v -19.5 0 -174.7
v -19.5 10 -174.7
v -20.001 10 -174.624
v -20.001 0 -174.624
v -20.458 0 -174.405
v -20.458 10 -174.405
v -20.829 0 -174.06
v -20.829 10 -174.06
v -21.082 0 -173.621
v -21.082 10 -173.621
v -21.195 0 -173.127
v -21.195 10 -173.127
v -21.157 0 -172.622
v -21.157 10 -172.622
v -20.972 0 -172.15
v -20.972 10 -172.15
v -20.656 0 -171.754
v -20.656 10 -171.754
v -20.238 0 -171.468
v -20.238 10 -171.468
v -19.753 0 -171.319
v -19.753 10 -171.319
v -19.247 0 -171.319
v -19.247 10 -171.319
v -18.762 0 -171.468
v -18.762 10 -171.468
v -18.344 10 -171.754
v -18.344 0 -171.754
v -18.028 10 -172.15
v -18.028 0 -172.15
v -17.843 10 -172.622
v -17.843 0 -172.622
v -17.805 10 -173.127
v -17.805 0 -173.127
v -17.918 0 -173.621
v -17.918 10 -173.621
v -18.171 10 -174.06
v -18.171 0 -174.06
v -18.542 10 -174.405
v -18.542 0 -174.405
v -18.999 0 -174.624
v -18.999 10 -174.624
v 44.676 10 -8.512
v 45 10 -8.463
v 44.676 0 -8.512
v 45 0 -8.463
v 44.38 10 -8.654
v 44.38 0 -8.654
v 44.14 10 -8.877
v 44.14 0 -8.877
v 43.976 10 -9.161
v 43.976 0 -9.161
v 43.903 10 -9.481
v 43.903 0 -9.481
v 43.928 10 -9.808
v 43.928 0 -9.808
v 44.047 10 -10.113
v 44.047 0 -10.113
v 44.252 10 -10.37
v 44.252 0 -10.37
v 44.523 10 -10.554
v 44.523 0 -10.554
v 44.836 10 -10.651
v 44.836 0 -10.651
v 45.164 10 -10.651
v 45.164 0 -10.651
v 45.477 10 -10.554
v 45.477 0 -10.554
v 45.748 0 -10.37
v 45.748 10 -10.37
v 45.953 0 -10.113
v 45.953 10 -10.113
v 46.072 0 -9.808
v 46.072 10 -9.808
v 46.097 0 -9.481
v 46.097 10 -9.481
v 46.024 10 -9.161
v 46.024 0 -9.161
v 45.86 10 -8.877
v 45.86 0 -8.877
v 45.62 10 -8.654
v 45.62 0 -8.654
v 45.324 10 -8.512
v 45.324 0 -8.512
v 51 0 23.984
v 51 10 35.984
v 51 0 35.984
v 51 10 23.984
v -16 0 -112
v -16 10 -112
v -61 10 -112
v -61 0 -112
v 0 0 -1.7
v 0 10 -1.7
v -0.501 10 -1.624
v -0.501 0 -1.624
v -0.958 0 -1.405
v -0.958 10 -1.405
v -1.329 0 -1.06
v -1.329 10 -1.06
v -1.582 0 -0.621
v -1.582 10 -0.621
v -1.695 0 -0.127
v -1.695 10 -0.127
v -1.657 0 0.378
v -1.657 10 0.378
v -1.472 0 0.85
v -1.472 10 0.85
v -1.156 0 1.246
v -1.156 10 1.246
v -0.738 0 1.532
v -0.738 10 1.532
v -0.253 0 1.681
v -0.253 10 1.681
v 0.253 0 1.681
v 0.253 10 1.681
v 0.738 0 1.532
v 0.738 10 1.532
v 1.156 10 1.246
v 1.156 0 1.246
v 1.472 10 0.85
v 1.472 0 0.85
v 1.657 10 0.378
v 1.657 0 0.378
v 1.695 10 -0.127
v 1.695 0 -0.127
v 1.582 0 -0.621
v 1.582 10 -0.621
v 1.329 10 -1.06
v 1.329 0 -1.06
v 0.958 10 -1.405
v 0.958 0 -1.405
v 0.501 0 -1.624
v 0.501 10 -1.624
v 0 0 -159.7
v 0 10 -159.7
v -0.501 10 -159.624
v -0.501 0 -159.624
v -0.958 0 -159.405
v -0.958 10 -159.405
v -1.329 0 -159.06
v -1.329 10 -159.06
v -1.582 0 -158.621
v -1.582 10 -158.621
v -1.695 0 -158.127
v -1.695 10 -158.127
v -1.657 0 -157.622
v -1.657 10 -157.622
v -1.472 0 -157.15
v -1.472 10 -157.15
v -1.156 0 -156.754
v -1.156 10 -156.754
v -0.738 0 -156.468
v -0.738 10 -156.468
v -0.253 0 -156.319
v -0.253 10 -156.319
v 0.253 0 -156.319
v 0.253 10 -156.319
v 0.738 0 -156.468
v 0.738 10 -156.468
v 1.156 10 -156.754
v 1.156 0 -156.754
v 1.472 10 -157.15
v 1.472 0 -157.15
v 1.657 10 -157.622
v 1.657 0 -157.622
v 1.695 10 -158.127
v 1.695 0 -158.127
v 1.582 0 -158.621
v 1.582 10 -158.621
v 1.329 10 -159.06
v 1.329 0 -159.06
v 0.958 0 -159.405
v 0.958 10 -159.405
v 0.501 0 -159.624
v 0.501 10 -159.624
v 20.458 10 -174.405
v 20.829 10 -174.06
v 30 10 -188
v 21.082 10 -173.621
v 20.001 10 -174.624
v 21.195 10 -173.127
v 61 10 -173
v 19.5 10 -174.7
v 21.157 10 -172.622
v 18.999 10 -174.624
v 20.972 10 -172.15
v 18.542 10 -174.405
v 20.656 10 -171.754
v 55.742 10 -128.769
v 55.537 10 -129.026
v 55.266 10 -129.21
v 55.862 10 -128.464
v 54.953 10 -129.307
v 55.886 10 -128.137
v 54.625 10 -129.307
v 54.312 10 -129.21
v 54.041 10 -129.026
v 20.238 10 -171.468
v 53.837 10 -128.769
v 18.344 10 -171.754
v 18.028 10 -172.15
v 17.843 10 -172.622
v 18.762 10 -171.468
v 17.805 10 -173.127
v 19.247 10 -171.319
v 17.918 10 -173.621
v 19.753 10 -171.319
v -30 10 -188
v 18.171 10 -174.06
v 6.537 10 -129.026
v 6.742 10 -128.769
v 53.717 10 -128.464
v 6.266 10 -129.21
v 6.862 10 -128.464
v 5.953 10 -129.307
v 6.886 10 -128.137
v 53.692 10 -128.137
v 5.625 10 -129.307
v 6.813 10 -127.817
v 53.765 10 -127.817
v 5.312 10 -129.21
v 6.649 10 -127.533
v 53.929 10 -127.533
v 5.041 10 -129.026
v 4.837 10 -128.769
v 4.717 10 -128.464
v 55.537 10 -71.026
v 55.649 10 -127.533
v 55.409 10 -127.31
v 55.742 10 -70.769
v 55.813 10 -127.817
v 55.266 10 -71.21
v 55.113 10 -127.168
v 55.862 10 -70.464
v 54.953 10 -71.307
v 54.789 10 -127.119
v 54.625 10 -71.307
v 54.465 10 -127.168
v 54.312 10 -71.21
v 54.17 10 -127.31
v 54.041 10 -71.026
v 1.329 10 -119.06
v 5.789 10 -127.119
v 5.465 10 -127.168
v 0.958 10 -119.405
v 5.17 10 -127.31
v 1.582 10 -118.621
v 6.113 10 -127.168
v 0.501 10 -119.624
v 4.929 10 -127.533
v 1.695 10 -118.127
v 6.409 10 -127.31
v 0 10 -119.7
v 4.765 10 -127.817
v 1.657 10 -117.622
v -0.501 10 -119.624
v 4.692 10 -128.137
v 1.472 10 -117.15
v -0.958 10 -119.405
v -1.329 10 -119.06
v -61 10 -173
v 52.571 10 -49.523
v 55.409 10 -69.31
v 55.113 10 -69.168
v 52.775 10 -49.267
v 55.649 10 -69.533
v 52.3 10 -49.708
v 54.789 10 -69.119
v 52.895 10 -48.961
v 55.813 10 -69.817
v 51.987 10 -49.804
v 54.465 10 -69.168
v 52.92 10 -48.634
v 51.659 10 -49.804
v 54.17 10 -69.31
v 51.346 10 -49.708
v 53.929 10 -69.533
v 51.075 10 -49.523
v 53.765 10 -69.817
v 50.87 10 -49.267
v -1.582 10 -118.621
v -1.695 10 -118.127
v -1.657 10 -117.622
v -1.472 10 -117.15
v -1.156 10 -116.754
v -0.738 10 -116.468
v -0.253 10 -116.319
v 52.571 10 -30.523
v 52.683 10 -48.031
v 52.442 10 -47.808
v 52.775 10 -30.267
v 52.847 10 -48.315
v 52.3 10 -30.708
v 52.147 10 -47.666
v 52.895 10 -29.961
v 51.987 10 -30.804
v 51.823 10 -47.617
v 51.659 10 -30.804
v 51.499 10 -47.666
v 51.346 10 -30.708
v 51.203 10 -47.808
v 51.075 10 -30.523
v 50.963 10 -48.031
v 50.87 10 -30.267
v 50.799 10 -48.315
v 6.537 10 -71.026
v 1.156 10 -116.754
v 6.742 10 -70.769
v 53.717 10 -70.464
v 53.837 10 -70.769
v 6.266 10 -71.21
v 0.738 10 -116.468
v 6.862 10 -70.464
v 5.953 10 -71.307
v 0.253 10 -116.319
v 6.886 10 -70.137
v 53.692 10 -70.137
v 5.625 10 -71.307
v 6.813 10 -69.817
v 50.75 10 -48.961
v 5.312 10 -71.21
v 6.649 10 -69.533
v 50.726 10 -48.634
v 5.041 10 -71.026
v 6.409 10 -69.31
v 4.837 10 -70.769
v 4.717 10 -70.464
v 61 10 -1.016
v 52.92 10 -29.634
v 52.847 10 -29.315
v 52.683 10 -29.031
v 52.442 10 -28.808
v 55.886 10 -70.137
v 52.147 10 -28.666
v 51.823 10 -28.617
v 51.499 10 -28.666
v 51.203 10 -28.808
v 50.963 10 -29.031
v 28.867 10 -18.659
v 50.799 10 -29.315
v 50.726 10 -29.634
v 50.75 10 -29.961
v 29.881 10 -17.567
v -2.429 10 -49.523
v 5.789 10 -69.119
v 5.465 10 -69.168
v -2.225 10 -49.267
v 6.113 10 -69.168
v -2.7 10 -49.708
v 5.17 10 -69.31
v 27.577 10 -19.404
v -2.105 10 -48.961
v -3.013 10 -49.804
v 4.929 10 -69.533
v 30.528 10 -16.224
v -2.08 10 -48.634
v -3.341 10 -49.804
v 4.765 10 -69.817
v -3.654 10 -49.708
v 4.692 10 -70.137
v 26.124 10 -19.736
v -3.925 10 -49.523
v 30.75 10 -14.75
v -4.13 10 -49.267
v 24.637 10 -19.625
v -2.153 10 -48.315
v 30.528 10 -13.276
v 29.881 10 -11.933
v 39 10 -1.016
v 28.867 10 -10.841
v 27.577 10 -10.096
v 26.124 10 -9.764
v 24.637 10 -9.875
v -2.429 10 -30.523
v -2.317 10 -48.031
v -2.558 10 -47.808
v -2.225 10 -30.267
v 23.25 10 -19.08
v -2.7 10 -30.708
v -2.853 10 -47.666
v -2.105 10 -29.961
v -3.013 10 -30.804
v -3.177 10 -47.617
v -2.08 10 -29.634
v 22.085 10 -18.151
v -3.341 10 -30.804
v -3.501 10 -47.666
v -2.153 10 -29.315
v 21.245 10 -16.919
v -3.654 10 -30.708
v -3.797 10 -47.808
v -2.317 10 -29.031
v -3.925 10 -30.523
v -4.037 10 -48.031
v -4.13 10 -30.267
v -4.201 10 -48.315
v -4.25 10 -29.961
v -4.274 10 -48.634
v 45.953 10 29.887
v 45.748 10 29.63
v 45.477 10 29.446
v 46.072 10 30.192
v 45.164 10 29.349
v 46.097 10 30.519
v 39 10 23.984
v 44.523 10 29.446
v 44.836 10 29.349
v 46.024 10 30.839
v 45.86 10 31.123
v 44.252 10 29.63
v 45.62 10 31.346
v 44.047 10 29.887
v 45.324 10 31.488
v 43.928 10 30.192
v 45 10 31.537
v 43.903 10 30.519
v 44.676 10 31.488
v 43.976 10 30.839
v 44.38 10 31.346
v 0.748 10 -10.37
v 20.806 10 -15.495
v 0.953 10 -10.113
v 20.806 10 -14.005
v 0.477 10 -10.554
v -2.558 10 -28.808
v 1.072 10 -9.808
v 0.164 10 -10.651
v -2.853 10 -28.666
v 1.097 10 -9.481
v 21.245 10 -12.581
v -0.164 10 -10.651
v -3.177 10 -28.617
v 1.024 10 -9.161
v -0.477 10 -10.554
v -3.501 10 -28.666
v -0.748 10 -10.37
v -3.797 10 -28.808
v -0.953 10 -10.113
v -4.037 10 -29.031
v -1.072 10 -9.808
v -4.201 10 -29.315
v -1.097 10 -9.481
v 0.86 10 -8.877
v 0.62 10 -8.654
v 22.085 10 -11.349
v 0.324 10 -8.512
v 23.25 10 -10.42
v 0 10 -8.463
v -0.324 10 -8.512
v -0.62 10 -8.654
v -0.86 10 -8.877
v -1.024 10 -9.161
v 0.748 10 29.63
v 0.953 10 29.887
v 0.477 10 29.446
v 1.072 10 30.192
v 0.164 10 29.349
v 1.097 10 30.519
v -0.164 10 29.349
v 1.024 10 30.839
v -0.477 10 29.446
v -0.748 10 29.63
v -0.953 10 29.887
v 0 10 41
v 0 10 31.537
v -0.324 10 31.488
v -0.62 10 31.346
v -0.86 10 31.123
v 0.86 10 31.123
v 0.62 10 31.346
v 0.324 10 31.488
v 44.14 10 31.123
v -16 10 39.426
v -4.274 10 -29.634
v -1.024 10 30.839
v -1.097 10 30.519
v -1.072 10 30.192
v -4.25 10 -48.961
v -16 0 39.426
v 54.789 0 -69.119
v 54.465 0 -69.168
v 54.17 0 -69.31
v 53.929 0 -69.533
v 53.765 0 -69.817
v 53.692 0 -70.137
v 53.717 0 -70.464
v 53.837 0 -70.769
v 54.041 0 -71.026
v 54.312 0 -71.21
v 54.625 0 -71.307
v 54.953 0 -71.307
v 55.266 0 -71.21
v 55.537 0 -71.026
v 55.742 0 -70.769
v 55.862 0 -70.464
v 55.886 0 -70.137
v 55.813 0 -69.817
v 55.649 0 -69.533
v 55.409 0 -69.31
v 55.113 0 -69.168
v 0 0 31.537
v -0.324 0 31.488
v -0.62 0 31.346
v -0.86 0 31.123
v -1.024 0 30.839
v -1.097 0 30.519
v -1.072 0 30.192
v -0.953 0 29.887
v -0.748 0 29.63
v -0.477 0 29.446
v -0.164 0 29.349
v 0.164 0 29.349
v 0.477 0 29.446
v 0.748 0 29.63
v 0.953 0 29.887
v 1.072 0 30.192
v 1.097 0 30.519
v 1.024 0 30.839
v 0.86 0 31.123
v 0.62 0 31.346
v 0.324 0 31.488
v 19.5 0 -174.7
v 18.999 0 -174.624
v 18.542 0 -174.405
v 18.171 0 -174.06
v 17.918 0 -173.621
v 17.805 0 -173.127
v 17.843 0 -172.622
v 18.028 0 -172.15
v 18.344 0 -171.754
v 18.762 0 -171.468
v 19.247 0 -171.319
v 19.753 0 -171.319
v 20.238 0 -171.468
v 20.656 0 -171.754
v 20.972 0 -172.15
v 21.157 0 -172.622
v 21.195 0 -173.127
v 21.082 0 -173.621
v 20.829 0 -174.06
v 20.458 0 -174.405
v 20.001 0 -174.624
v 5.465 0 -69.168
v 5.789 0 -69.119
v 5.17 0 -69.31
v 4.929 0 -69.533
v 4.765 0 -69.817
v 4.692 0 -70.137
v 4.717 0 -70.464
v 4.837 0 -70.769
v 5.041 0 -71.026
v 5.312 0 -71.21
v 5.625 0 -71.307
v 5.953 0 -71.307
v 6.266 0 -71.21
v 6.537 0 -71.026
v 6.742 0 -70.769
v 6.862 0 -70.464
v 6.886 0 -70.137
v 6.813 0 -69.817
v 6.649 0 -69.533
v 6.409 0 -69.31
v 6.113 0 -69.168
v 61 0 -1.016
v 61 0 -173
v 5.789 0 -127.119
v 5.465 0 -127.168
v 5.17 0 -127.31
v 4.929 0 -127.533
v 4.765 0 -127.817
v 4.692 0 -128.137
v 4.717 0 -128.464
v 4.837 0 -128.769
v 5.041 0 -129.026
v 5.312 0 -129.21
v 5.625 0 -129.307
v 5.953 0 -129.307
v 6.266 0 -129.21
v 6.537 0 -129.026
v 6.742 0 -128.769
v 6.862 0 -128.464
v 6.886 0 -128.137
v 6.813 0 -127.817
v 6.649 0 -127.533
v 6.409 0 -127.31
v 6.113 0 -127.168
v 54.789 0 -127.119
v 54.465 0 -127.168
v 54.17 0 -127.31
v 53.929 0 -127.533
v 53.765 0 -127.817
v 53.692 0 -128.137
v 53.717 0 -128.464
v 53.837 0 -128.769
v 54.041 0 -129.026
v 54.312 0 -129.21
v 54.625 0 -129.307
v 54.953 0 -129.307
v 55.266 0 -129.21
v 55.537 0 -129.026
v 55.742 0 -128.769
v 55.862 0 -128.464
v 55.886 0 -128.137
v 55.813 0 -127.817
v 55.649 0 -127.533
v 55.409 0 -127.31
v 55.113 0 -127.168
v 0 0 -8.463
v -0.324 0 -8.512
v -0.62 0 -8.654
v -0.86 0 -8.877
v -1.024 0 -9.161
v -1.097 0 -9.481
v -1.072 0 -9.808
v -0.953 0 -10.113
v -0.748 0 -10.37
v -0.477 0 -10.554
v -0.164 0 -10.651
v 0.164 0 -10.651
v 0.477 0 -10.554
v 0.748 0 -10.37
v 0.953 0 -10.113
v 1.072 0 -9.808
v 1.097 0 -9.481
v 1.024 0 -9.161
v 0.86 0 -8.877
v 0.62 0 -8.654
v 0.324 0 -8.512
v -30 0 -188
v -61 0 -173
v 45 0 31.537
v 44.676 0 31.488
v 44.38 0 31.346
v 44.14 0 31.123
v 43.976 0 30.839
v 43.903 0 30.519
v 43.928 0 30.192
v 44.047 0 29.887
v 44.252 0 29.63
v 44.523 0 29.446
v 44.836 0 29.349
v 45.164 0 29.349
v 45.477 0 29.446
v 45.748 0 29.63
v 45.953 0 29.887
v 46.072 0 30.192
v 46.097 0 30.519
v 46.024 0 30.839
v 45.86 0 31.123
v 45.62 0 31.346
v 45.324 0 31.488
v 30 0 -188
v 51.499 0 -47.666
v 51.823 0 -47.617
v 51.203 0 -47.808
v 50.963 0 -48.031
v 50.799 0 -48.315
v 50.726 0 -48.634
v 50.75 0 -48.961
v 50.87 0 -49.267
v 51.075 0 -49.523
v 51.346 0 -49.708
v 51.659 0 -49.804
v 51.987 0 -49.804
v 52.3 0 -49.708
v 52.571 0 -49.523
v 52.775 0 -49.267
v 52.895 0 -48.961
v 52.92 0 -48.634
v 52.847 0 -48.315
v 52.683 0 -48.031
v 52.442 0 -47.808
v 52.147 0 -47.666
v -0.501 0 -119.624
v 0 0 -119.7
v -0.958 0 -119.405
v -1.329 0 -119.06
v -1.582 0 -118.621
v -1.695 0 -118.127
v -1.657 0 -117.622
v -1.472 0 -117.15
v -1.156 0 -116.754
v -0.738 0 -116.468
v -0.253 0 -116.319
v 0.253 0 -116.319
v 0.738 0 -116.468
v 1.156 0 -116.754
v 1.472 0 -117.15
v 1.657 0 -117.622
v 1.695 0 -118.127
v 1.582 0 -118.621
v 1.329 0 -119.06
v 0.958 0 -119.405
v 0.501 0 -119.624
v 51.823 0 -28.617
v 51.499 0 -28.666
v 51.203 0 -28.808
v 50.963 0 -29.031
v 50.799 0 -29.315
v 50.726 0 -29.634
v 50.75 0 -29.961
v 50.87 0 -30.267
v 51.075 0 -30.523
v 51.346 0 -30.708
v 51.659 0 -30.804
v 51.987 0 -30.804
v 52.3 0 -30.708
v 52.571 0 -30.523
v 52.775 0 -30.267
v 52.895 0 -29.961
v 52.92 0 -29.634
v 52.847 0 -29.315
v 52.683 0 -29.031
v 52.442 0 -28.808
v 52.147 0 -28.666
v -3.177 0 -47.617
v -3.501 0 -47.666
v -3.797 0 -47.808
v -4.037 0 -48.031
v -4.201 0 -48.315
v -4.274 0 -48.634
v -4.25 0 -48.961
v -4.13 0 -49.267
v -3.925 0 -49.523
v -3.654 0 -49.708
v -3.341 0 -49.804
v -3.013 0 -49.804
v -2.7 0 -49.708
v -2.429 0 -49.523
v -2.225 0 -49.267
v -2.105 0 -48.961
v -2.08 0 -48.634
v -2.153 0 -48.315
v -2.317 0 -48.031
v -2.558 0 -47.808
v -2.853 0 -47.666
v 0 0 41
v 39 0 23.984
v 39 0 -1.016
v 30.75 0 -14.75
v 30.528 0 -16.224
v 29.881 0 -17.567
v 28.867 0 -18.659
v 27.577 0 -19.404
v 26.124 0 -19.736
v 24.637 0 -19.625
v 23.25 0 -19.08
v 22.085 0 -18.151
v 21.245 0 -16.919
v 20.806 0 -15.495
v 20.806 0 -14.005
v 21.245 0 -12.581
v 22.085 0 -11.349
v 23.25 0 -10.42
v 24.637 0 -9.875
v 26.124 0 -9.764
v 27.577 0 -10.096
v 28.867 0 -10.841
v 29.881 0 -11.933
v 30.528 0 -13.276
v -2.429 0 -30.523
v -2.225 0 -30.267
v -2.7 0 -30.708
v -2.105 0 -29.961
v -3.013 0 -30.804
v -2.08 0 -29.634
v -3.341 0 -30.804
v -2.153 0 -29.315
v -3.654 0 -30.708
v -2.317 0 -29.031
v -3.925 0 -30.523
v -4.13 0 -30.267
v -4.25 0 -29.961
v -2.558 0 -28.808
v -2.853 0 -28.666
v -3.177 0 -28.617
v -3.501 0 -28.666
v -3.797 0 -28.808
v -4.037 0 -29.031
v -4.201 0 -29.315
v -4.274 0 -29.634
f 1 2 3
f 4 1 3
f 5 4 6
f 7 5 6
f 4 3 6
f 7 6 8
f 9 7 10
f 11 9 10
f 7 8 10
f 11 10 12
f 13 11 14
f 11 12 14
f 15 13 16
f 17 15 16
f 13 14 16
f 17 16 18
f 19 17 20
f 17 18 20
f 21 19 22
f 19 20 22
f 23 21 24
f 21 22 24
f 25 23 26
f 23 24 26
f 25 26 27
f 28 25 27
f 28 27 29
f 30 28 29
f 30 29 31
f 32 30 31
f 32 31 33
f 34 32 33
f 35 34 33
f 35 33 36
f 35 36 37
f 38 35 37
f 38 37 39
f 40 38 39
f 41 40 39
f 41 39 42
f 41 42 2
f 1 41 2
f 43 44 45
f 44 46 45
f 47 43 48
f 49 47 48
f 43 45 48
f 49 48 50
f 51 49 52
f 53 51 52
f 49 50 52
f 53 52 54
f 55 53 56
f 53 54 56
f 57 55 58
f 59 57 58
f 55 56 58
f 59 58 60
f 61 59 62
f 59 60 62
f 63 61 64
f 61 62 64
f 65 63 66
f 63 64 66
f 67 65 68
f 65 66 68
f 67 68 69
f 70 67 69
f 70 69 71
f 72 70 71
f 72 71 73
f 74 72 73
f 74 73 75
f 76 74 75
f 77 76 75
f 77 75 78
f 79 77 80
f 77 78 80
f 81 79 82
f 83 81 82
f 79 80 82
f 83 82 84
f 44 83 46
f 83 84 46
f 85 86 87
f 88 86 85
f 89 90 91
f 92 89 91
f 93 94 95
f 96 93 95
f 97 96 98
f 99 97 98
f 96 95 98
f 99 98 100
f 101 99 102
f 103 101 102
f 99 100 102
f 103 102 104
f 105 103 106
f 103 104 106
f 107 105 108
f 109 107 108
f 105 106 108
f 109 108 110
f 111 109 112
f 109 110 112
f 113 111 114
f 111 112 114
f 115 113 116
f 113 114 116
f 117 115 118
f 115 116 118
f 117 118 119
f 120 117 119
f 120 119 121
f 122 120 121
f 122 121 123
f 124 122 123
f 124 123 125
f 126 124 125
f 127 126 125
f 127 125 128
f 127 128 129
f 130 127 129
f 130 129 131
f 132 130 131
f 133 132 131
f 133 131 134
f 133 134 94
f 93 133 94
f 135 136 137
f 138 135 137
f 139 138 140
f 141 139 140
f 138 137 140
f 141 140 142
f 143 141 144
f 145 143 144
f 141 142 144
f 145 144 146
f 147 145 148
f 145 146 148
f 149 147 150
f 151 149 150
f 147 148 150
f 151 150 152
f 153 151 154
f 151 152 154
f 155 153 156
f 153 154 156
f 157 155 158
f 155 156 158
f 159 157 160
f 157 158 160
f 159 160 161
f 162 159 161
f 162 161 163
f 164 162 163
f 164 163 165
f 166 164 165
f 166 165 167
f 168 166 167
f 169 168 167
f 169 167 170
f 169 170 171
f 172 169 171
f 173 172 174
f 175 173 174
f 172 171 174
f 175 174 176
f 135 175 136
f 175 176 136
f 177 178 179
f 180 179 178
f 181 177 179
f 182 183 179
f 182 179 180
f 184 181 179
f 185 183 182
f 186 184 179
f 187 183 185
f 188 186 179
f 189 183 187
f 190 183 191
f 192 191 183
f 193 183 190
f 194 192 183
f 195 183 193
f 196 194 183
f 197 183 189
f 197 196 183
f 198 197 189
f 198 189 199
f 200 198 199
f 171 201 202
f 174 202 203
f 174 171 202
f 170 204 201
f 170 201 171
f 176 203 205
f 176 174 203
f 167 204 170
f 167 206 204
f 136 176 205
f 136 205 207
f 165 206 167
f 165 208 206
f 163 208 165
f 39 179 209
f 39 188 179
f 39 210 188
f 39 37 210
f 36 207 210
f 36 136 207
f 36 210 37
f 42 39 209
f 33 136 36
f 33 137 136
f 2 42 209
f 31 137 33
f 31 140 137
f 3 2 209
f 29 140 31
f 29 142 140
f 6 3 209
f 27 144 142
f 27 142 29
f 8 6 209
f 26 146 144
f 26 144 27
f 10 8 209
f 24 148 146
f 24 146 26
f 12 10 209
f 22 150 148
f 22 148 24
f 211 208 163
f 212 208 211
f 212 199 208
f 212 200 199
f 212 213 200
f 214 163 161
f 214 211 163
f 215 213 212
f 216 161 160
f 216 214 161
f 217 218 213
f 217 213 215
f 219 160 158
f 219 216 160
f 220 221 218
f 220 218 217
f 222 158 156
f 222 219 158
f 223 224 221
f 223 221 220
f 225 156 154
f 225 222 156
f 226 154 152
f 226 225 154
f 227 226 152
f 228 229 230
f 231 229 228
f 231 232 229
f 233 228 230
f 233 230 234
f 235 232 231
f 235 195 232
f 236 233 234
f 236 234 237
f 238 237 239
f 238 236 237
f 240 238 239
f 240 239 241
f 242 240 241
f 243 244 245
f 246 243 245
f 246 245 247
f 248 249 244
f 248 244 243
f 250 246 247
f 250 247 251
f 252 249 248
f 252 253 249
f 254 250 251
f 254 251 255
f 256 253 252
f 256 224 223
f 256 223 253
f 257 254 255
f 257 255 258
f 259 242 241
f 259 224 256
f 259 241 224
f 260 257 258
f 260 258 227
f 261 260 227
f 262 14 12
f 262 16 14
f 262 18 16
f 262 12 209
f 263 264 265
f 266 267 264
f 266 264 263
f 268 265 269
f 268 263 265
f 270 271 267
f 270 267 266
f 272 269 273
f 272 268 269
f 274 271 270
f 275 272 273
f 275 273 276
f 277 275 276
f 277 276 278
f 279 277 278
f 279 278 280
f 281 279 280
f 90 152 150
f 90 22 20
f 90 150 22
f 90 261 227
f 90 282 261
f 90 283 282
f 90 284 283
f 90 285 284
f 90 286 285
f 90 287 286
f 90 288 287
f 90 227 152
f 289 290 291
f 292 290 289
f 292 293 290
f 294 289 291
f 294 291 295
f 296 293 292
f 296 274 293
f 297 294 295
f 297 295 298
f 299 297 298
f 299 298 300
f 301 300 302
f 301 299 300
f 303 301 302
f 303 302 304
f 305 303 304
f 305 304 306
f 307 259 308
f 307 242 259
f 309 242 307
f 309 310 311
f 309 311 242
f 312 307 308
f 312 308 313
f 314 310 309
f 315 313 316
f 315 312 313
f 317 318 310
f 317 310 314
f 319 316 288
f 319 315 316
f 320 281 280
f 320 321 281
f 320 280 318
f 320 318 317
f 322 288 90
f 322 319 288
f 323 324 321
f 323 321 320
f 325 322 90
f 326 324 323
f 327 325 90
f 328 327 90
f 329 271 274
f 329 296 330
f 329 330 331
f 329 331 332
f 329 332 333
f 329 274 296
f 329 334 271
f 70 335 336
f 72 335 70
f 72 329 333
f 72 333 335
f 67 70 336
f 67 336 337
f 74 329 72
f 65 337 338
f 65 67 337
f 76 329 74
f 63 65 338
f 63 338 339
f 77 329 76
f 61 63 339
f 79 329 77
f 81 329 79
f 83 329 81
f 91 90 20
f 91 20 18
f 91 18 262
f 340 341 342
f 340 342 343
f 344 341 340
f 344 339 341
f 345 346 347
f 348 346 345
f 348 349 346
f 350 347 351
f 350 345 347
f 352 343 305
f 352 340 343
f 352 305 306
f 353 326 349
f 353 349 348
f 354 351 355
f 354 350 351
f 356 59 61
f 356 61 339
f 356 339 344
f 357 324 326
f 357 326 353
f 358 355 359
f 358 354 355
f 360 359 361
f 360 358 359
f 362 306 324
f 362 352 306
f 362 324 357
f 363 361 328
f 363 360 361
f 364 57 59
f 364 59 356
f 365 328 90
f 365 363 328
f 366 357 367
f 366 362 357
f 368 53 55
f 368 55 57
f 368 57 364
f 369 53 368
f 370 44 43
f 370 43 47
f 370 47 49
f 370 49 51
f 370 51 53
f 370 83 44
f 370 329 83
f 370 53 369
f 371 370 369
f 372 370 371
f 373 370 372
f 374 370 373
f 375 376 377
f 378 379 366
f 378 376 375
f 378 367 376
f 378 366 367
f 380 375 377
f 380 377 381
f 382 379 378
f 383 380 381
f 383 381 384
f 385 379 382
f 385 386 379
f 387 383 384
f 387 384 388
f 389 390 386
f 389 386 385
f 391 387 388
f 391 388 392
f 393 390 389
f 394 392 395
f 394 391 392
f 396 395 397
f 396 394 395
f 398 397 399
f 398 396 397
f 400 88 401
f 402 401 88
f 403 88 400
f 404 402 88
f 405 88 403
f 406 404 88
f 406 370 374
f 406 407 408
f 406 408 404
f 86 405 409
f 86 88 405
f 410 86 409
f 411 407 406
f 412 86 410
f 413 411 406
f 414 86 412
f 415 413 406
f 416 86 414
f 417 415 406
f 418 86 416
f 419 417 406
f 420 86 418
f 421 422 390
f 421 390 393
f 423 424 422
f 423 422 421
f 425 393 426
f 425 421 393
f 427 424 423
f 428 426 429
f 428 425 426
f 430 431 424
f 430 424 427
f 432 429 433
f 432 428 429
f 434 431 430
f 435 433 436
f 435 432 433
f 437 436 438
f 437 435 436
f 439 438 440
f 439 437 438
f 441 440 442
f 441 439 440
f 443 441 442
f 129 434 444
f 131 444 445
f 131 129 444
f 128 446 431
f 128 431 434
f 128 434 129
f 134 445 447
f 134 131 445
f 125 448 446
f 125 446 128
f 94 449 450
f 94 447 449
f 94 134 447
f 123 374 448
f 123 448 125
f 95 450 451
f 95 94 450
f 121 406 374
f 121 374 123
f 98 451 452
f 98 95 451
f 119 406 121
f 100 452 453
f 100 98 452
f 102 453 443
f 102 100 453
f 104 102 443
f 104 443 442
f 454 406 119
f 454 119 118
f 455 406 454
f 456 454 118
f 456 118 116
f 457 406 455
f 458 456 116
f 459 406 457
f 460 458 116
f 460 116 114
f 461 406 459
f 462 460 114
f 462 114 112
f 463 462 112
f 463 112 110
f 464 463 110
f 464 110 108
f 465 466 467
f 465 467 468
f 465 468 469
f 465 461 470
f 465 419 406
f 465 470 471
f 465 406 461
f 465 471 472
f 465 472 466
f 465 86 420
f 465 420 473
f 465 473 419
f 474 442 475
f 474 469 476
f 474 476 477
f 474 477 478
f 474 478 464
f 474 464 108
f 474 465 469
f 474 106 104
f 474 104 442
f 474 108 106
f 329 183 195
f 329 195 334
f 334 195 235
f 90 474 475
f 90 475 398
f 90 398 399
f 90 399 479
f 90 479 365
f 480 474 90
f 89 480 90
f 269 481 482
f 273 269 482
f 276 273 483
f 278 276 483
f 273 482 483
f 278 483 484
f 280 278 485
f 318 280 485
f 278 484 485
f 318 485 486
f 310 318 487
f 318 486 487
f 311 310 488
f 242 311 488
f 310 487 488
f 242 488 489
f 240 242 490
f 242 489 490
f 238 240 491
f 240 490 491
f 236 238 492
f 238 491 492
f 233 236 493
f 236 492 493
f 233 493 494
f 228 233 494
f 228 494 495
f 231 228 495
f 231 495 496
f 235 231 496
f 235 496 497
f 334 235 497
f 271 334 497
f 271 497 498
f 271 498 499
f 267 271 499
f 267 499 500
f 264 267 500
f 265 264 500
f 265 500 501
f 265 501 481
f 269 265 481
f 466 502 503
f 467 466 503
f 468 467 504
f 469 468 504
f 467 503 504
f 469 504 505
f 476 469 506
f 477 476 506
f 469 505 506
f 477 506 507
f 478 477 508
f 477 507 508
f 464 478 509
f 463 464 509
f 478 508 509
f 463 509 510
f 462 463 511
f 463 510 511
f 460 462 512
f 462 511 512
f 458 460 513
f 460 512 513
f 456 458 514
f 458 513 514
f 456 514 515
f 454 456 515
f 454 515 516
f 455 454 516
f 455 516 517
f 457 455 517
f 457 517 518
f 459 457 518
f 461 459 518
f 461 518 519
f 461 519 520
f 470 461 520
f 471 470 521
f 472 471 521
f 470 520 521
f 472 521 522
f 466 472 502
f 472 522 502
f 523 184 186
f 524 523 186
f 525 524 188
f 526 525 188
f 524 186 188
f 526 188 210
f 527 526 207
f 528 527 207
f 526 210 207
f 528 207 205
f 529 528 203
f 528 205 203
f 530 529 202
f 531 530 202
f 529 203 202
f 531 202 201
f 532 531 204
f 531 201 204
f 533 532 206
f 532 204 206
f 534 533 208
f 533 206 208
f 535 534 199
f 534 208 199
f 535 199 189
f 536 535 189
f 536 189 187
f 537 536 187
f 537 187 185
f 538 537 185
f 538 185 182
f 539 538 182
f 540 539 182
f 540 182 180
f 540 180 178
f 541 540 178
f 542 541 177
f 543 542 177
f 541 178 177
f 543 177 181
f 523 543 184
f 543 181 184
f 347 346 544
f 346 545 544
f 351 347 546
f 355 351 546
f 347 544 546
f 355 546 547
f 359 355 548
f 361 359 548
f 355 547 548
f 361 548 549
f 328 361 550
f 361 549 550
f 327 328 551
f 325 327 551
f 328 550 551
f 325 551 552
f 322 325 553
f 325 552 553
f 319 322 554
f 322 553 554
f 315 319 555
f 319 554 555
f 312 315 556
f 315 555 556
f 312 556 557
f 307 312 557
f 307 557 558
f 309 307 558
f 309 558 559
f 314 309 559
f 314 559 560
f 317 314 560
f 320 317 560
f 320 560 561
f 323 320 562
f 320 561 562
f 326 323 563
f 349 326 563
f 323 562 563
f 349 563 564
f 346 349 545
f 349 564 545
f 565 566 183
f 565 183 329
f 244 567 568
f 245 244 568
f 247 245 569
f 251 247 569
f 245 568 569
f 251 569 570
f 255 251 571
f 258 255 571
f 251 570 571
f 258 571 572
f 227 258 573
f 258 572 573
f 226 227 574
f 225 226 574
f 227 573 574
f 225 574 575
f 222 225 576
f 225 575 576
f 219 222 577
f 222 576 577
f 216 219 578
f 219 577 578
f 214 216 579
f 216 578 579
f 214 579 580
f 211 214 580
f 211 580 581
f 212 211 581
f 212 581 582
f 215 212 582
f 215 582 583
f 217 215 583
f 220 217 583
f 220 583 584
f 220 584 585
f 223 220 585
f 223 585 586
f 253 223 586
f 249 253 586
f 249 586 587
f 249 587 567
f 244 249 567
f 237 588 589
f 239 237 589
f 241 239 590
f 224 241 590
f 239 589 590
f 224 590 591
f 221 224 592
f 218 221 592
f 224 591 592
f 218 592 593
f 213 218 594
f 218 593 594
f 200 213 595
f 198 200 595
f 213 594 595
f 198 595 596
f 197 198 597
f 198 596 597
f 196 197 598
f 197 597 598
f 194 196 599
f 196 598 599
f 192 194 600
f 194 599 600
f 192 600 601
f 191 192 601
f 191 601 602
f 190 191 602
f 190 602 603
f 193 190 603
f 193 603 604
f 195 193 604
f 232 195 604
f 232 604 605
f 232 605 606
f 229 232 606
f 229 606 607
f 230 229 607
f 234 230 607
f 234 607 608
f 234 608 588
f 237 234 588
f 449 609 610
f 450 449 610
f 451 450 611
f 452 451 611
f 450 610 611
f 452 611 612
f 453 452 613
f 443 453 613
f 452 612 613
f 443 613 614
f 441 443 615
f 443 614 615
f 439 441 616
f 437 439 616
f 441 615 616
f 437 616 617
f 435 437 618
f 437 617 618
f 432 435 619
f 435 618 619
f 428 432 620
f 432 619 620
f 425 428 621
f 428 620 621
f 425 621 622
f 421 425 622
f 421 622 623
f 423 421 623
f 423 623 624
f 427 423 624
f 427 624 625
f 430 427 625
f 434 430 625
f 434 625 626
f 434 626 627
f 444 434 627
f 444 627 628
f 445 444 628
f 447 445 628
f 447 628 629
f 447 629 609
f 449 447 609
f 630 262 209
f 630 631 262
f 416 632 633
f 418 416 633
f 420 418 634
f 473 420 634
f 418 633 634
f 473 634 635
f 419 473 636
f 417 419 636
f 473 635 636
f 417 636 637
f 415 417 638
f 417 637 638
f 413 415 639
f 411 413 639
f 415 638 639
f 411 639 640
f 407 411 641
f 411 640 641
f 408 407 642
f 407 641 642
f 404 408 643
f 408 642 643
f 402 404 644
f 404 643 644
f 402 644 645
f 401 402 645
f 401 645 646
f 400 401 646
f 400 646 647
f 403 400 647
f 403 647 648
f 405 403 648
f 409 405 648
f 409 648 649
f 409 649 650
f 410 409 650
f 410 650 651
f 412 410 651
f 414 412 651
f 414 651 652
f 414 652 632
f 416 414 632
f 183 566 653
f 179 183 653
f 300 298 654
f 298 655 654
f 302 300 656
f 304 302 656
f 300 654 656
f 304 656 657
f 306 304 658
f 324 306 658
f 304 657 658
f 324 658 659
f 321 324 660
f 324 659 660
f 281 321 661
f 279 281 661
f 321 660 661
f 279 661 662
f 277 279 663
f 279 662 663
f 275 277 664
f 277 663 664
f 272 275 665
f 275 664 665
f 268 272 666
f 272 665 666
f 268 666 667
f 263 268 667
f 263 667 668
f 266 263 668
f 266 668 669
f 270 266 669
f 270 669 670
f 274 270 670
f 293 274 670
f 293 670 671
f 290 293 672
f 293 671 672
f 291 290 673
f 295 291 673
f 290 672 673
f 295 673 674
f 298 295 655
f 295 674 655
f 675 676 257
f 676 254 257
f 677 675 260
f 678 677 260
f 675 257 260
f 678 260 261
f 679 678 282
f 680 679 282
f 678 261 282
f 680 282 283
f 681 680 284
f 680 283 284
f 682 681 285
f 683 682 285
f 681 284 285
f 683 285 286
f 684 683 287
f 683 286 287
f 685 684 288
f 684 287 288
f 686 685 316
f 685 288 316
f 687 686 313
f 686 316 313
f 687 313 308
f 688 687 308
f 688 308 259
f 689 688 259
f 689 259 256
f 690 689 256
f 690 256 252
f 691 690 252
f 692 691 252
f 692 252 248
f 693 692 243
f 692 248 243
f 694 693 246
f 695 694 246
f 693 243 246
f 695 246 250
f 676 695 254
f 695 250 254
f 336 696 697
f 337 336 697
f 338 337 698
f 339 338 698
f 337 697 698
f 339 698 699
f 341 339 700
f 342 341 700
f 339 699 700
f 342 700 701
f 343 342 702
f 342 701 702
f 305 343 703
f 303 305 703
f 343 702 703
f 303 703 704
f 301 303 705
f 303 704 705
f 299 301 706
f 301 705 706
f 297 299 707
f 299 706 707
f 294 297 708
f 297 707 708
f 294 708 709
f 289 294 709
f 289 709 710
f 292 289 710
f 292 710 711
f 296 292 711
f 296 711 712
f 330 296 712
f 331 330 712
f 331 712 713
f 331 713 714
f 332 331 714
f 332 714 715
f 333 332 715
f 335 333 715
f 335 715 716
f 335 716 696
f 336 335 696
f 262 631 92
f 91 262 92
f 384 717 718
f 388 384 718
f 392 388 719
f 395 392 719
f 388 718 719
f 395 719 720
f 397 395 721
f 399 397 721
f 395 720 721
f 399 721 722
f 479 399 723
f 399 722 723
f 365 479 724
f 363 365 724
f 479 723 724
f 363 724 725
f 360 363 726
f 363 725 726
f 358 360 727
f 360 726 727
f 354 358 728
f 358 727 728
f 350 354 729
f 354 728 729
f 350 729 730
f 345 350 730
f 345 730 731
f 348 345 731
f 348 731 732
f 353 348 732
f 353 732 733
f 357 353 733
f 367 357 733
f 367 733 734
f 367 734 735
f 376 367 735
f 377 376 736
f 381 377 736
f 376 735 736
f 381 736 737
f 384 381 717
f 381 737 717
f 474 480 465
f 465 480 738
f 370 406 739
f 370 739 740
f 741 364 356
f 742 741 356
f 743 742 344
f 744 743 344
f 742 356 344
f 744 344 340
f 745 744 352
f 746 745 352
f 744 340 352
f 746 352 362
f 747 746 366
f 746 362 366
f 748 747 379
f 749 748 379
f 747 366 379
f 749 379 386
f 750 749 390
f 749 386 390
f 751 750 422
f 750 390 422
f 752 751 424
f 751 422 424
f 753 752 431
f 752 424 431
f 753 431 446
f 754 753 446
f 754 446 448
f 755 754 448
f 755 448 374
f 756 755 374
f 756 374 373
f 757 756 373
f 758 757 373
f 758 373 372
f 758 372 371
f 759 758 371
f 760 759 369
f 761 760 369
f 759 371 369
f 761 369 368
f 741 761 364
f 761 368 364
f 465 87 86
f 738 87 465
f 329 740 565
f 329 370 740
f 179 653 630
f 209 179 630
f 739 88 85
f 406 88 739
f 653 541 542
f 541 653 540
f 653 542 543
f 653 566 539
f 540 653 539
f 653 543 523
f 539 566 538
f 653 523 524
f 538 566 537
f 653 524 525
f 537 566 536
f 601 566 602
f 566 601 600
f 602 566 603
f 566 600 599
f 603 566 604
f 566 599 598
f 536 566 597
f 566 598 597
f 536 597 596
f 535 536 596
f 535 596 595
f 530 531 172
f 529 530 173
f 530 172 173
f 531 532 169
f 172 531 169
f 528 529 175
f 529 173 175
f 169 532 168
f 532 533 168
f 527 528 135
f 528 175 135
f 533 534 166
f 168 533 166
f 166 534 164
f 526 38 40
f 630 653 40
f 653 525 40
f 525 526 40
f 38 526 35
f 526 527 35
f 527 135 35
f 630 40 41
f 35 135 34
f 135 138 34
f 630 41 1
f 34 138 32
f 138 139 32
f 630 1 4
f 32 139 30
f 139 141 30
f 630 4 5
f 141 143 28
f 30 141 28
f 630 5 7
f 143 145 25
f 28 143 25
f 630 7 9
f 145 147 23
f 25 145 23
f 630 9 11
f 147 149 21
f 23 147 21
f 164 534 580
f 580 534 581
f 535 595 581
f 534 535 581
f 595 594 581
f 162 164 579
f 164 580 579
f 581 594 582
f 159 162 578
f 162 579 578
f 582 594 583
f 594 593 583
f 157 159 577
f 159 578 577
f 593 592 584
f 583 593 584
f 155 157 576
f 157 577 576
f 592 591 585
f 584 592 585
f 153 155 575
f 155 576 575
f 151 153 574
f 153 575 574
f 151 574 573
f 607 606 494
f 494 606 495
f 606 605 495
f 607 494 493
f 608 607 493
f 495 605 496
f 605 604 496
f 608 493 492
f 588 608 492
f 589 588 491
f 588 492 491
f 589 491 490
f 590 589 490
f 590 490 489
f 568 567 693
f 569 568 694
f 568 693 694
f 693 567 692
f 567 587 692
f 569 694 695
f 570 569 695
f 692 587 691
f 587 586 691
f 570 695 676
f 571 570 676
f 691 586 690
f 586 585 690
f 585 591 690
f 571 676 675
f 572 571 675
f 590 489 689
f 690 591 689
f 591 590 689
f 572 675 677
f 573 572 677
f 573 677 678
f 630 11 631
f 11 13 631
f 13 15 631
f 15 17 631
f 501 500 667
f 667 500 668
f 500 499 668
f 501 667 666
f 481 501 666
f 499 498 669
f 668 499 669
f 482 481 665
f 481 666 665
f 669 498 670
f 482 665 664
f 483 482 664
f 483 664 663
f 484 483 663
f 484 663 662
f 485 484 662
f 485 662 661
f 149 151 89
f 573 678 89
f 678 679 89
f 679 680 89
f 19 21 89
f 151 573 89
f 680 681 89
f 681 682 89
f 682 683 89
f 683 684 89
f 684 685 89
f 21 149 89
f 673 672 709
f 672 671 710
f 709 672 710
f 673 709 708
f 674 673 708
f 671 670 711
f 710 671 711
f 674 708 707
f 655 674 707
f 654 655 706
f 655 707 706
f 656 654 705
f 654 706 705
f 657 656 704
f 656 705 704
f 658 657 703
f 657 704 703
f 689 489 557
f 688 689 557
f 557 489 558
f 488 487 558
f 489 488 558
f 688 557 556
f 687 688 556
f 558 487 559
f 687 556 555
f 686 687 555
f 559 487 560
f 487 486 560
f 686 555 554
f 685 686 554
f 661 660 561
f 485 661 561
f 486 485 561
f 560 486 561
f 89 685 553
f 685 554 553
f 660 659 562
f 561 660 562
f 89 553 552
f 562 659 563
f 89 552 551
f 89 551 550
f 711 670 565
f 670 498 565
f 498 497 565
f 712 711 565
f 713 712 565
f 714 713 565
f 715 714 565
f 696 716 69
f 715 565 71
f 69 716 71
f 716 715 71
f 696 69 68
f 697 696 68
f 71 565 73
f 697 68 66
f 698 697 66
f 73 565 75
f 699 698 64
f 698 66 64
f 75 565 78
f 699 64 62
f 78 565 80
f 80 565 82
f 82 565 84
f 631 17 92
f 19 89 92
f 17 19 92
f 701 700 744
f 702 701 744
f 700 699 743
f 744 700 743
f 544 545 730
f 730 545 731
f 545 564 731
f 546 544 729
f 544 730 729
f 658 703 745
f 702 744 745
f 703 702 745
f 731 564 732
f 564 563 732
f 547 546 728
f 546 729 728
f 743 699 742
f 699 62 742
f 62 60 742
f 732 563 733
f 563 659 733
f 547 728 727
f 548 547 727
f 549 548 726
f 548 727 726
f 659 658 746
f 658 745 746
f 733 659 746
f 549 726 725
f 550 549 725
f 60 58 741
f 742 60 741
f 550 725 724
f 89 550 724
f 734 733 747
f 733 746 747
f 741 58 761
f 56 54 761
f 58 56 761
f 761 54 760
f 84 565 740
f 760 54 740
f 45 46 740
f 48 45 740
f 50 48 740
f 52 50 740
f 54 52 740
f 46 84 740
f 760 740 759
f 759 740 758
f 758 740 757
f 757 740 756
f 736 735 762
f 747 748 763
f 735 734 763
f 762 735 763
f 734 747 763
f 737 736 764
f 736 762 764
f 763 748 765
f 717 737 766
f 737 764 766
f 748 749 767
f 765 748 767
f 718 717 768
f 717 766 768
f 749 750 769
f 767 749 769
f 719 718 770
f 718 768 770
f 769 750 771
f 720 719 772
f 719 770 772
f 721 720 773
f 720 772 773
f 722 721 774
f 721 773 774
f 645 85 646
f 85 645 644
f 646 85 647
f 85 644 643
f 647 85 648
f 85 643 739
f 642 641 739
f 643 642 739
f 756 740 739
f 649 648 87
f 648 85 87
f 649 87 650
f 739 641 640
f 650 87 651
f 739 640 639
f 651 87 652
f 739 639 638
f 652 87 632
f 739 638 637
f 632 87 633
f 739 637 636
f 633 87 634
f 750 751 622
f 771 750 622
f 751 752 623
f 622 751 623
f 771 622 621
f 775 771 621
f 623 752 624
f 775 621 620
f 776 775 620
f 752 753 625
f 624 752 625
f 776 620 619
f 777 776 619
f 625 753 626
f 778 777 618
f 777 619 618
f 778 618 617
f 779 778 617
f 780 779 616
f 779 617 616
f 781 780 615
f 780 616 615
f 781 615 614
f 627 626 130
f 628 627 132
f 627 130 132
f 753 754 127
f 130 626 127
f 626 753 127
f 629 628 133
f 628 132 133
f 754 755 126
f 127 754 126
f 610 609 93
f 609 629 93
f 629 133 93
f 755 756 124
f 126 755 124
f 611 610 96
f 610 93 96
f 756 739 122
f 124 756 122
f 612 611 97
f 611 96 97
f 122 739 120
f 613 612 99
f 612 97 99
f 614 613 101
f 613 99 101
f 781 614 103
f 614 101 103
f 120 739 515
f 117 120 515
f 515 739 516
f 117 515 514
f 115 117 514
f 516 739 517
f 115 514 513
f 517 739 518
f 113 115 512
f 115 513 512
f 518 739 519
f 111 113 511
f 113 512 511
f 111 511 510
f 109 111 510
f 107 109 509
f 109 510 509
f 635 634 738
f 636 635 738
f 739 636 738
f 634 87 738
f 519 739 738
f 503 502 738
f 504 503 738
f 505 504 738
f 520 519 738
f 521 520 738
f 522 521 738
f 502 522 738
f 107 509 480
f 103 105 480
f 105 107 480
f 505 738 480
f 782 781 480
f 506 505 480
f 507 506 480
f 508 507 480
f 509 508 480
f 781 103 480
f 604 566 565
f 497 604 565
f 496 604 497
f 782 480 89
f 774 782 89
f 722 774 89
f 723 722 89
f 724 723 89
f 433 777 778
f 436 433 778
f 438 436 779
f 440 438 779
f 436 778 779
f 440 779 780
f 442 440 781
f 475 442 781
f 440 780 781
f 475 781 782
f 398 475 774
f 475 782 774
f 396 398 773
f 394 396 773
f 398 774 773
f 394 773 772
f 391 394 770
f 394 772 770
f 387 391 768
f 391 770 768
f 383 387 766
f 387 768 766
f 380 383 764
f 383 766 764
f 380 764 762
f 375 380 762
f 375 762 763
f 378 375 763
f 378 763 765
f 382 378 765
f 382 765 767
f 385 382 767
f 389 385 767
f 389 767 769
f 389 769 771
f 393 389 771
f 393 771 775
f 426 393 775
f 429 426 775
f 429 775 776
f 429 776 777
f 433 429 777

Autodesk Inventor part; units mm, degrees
ref_plane "YZ Plane" through (0, 0, 0) normal (1, 0, 0) x (0, 1, 0)
ref_plane "XZ Plane" through (0, 0, 0) normal (0, 1, 0) x (-1, 0, 0)
ref_plane "XY Plane" through (0, 0, 0) normal (0, 0, 1) x (1, 0, 0)
sketch "Sketch1" plane through (0, 0, 0) normal (0, 1, 0) x (-1, 0, 0)
  line L0 (19.5, -173) -> (0, -173) construction
  line L1 (0, -173) -> (-19.5, -173) construction
  line L2 (61, -173) -> (61, 35)
  line L3 (0, 0) -> (0, -173) construction
  line L4 (0, -188) -> (30, -188)
  line L5 (61, -173) -> (30, -188)
  line L6 (61, 35) -> (0, 41)
  line L7 (-61, -173) -> (-61, 35)
  line L8 (0, -188) -> (-30, -188)
  line L9 (-61, -173) -> (-30, -188)
  line L10 (-61, 35) -> (0, 41)
  point P0 (0, -118)
  point P1 (0, -158)
  dimension "d0" = 118
  dimension "d1" = 40
  dimension "d2" = 19.5
  dimension "d3" = 15
  dimension "d4" = 61
  dimension "d6" = 15
  dimension "d7" = 35
  dimension "d8" = 41
  dimension "d11" = 30
extrude "uitlijn plaatje" add sketch "Sketch1" along normal blind 10
hole "Hole1" at (-19.5, 0, -173) at (19.5, 0, -173) at (0, 0, 0) at (0, 0, -118) at (0, 0, -158) direction (0, 1, 0) diameter 3.4 end through all clearance for "Hex Head Cap Screw ISO 24017" size "M3" standard "ISO"
sketch "batterij uitsnijding" plane through (0, 10, 0) normal (0, 1, 0) x (1, 0, 0)
  line L0 (-61, -35) -> (0, -41) projected
  line L1 (-16, -39.4262) -> (-16, 112)
  line L2 (-16, 112) -> (-61, 112)
  line L3 (-61, 173) -> (-61, -35) projected
  point P0 (0, 0)
  dimension "d21" = 45
  dimension "d22" = 112
extrude "Extrusion2" cut sketch "batterij uitsnijding" against normal blind 10
sketch "Sketch3" plane through (0, 10, 0) normal (0, 1, 0) x (1, 0, 0)
  circle A0 centre (25.75, 14.75) radius 5
  point P0 (0, 0)
  dimension "d26" = 14.75
  dimension "d27" = 25.75
  dimension "d28" = 10
extrude "Extrusion3" cut sketch "Sketch3" against normal blind 10
sketch "Sketch4" plane through (0, 10, 0) normal (0, 1, 0) x (1, 0, 0)
  line L0 (56.6557, 151.7192) -> (-9.4519, 151.7192)
  line L1 (-9.4519, 151.7192) -> (-9.4519, 66.7192)
  line L2 (-9.4519, 66.7192) -> (56.6557, 66.7192)
  line L3 (56.6557, 66.7192) -> (56.6557, 151.7192)
  point P0 (0, 0)
  point P1 (0, -30.4368)
  point P2 (0, 9.5632)
  point P3 (45, -30.4368)
  point P4 (45, 9.5632)
  point P5 (51.8228, 48.7167)
  point P6 (51.8228, 29.7167)
  point P7 (-3.1772, 48.7167)
  point P8 (-3.1772, 29.7167)
  point P9 (5.7892, 70.2192)
  point P10 (54.7892, 70.2192)
  point P11 (54.7892, 128.2192)
  point P12 (5.7892, 128.2192)
  dimension "d31" = 40
  dimension "d32" = 45
  dimension "d33" = 19
  dimension "d34" = 55
  dimension "d35" = 58
  dimension "d36" = 49
  dimension "d37" = 55
  dimension "d38" = 19
  dimension "d39" = 85
  dimension "d40" = 3.5
hole "Hole2" at (0, 10, 30.4368) at (0, 10, -9.5632) at (45, 10, 30.4368) at (45, 10, -9.5632) at (51.8228, 10, -48.7167) at (51.8228, 10, -29.7167) at (-3.1772, 10, -48.7167) at (-3.1772, 10, -29.7167) at (5.7892, 10, -70.2192) at (54.7892, 10, -70.2192) at (54.7892, 10, -128.2192) at (5.7892, 10, -128.2192) direction (0, -1, 0) diameter 2.2 end through all
sketch "Sketch5" plane through (0, 10, 0) normal (0, 1, 0) x (1, 0, 0)
  line L0 (0, -41) -> (61, -35) projected
  line L1 (51, -35.9836) -> (51, -23.9836)
  line L2 (51, -23.9836) -> (39, -23.9836)
  line L3 (39, -23.9836) -> (39, 1.0164)
  line L4 (39, 1.0164) -> (54.3101, 1.0164)
  line L5 (54.3101, 1.0164) -> (61, 1.0164)
  line L6 (61, -35) -> (61, 173) projected
  point P0 (0, 0)
  dimension "d48" = 25
  dimension "d49" = 12
  dimension "d50" = 10
  dimension "d51" = 12
extrude "Extrusion4" cut sketch "Sketch5" against normal blind 10
properties part number "montageplaatje"
